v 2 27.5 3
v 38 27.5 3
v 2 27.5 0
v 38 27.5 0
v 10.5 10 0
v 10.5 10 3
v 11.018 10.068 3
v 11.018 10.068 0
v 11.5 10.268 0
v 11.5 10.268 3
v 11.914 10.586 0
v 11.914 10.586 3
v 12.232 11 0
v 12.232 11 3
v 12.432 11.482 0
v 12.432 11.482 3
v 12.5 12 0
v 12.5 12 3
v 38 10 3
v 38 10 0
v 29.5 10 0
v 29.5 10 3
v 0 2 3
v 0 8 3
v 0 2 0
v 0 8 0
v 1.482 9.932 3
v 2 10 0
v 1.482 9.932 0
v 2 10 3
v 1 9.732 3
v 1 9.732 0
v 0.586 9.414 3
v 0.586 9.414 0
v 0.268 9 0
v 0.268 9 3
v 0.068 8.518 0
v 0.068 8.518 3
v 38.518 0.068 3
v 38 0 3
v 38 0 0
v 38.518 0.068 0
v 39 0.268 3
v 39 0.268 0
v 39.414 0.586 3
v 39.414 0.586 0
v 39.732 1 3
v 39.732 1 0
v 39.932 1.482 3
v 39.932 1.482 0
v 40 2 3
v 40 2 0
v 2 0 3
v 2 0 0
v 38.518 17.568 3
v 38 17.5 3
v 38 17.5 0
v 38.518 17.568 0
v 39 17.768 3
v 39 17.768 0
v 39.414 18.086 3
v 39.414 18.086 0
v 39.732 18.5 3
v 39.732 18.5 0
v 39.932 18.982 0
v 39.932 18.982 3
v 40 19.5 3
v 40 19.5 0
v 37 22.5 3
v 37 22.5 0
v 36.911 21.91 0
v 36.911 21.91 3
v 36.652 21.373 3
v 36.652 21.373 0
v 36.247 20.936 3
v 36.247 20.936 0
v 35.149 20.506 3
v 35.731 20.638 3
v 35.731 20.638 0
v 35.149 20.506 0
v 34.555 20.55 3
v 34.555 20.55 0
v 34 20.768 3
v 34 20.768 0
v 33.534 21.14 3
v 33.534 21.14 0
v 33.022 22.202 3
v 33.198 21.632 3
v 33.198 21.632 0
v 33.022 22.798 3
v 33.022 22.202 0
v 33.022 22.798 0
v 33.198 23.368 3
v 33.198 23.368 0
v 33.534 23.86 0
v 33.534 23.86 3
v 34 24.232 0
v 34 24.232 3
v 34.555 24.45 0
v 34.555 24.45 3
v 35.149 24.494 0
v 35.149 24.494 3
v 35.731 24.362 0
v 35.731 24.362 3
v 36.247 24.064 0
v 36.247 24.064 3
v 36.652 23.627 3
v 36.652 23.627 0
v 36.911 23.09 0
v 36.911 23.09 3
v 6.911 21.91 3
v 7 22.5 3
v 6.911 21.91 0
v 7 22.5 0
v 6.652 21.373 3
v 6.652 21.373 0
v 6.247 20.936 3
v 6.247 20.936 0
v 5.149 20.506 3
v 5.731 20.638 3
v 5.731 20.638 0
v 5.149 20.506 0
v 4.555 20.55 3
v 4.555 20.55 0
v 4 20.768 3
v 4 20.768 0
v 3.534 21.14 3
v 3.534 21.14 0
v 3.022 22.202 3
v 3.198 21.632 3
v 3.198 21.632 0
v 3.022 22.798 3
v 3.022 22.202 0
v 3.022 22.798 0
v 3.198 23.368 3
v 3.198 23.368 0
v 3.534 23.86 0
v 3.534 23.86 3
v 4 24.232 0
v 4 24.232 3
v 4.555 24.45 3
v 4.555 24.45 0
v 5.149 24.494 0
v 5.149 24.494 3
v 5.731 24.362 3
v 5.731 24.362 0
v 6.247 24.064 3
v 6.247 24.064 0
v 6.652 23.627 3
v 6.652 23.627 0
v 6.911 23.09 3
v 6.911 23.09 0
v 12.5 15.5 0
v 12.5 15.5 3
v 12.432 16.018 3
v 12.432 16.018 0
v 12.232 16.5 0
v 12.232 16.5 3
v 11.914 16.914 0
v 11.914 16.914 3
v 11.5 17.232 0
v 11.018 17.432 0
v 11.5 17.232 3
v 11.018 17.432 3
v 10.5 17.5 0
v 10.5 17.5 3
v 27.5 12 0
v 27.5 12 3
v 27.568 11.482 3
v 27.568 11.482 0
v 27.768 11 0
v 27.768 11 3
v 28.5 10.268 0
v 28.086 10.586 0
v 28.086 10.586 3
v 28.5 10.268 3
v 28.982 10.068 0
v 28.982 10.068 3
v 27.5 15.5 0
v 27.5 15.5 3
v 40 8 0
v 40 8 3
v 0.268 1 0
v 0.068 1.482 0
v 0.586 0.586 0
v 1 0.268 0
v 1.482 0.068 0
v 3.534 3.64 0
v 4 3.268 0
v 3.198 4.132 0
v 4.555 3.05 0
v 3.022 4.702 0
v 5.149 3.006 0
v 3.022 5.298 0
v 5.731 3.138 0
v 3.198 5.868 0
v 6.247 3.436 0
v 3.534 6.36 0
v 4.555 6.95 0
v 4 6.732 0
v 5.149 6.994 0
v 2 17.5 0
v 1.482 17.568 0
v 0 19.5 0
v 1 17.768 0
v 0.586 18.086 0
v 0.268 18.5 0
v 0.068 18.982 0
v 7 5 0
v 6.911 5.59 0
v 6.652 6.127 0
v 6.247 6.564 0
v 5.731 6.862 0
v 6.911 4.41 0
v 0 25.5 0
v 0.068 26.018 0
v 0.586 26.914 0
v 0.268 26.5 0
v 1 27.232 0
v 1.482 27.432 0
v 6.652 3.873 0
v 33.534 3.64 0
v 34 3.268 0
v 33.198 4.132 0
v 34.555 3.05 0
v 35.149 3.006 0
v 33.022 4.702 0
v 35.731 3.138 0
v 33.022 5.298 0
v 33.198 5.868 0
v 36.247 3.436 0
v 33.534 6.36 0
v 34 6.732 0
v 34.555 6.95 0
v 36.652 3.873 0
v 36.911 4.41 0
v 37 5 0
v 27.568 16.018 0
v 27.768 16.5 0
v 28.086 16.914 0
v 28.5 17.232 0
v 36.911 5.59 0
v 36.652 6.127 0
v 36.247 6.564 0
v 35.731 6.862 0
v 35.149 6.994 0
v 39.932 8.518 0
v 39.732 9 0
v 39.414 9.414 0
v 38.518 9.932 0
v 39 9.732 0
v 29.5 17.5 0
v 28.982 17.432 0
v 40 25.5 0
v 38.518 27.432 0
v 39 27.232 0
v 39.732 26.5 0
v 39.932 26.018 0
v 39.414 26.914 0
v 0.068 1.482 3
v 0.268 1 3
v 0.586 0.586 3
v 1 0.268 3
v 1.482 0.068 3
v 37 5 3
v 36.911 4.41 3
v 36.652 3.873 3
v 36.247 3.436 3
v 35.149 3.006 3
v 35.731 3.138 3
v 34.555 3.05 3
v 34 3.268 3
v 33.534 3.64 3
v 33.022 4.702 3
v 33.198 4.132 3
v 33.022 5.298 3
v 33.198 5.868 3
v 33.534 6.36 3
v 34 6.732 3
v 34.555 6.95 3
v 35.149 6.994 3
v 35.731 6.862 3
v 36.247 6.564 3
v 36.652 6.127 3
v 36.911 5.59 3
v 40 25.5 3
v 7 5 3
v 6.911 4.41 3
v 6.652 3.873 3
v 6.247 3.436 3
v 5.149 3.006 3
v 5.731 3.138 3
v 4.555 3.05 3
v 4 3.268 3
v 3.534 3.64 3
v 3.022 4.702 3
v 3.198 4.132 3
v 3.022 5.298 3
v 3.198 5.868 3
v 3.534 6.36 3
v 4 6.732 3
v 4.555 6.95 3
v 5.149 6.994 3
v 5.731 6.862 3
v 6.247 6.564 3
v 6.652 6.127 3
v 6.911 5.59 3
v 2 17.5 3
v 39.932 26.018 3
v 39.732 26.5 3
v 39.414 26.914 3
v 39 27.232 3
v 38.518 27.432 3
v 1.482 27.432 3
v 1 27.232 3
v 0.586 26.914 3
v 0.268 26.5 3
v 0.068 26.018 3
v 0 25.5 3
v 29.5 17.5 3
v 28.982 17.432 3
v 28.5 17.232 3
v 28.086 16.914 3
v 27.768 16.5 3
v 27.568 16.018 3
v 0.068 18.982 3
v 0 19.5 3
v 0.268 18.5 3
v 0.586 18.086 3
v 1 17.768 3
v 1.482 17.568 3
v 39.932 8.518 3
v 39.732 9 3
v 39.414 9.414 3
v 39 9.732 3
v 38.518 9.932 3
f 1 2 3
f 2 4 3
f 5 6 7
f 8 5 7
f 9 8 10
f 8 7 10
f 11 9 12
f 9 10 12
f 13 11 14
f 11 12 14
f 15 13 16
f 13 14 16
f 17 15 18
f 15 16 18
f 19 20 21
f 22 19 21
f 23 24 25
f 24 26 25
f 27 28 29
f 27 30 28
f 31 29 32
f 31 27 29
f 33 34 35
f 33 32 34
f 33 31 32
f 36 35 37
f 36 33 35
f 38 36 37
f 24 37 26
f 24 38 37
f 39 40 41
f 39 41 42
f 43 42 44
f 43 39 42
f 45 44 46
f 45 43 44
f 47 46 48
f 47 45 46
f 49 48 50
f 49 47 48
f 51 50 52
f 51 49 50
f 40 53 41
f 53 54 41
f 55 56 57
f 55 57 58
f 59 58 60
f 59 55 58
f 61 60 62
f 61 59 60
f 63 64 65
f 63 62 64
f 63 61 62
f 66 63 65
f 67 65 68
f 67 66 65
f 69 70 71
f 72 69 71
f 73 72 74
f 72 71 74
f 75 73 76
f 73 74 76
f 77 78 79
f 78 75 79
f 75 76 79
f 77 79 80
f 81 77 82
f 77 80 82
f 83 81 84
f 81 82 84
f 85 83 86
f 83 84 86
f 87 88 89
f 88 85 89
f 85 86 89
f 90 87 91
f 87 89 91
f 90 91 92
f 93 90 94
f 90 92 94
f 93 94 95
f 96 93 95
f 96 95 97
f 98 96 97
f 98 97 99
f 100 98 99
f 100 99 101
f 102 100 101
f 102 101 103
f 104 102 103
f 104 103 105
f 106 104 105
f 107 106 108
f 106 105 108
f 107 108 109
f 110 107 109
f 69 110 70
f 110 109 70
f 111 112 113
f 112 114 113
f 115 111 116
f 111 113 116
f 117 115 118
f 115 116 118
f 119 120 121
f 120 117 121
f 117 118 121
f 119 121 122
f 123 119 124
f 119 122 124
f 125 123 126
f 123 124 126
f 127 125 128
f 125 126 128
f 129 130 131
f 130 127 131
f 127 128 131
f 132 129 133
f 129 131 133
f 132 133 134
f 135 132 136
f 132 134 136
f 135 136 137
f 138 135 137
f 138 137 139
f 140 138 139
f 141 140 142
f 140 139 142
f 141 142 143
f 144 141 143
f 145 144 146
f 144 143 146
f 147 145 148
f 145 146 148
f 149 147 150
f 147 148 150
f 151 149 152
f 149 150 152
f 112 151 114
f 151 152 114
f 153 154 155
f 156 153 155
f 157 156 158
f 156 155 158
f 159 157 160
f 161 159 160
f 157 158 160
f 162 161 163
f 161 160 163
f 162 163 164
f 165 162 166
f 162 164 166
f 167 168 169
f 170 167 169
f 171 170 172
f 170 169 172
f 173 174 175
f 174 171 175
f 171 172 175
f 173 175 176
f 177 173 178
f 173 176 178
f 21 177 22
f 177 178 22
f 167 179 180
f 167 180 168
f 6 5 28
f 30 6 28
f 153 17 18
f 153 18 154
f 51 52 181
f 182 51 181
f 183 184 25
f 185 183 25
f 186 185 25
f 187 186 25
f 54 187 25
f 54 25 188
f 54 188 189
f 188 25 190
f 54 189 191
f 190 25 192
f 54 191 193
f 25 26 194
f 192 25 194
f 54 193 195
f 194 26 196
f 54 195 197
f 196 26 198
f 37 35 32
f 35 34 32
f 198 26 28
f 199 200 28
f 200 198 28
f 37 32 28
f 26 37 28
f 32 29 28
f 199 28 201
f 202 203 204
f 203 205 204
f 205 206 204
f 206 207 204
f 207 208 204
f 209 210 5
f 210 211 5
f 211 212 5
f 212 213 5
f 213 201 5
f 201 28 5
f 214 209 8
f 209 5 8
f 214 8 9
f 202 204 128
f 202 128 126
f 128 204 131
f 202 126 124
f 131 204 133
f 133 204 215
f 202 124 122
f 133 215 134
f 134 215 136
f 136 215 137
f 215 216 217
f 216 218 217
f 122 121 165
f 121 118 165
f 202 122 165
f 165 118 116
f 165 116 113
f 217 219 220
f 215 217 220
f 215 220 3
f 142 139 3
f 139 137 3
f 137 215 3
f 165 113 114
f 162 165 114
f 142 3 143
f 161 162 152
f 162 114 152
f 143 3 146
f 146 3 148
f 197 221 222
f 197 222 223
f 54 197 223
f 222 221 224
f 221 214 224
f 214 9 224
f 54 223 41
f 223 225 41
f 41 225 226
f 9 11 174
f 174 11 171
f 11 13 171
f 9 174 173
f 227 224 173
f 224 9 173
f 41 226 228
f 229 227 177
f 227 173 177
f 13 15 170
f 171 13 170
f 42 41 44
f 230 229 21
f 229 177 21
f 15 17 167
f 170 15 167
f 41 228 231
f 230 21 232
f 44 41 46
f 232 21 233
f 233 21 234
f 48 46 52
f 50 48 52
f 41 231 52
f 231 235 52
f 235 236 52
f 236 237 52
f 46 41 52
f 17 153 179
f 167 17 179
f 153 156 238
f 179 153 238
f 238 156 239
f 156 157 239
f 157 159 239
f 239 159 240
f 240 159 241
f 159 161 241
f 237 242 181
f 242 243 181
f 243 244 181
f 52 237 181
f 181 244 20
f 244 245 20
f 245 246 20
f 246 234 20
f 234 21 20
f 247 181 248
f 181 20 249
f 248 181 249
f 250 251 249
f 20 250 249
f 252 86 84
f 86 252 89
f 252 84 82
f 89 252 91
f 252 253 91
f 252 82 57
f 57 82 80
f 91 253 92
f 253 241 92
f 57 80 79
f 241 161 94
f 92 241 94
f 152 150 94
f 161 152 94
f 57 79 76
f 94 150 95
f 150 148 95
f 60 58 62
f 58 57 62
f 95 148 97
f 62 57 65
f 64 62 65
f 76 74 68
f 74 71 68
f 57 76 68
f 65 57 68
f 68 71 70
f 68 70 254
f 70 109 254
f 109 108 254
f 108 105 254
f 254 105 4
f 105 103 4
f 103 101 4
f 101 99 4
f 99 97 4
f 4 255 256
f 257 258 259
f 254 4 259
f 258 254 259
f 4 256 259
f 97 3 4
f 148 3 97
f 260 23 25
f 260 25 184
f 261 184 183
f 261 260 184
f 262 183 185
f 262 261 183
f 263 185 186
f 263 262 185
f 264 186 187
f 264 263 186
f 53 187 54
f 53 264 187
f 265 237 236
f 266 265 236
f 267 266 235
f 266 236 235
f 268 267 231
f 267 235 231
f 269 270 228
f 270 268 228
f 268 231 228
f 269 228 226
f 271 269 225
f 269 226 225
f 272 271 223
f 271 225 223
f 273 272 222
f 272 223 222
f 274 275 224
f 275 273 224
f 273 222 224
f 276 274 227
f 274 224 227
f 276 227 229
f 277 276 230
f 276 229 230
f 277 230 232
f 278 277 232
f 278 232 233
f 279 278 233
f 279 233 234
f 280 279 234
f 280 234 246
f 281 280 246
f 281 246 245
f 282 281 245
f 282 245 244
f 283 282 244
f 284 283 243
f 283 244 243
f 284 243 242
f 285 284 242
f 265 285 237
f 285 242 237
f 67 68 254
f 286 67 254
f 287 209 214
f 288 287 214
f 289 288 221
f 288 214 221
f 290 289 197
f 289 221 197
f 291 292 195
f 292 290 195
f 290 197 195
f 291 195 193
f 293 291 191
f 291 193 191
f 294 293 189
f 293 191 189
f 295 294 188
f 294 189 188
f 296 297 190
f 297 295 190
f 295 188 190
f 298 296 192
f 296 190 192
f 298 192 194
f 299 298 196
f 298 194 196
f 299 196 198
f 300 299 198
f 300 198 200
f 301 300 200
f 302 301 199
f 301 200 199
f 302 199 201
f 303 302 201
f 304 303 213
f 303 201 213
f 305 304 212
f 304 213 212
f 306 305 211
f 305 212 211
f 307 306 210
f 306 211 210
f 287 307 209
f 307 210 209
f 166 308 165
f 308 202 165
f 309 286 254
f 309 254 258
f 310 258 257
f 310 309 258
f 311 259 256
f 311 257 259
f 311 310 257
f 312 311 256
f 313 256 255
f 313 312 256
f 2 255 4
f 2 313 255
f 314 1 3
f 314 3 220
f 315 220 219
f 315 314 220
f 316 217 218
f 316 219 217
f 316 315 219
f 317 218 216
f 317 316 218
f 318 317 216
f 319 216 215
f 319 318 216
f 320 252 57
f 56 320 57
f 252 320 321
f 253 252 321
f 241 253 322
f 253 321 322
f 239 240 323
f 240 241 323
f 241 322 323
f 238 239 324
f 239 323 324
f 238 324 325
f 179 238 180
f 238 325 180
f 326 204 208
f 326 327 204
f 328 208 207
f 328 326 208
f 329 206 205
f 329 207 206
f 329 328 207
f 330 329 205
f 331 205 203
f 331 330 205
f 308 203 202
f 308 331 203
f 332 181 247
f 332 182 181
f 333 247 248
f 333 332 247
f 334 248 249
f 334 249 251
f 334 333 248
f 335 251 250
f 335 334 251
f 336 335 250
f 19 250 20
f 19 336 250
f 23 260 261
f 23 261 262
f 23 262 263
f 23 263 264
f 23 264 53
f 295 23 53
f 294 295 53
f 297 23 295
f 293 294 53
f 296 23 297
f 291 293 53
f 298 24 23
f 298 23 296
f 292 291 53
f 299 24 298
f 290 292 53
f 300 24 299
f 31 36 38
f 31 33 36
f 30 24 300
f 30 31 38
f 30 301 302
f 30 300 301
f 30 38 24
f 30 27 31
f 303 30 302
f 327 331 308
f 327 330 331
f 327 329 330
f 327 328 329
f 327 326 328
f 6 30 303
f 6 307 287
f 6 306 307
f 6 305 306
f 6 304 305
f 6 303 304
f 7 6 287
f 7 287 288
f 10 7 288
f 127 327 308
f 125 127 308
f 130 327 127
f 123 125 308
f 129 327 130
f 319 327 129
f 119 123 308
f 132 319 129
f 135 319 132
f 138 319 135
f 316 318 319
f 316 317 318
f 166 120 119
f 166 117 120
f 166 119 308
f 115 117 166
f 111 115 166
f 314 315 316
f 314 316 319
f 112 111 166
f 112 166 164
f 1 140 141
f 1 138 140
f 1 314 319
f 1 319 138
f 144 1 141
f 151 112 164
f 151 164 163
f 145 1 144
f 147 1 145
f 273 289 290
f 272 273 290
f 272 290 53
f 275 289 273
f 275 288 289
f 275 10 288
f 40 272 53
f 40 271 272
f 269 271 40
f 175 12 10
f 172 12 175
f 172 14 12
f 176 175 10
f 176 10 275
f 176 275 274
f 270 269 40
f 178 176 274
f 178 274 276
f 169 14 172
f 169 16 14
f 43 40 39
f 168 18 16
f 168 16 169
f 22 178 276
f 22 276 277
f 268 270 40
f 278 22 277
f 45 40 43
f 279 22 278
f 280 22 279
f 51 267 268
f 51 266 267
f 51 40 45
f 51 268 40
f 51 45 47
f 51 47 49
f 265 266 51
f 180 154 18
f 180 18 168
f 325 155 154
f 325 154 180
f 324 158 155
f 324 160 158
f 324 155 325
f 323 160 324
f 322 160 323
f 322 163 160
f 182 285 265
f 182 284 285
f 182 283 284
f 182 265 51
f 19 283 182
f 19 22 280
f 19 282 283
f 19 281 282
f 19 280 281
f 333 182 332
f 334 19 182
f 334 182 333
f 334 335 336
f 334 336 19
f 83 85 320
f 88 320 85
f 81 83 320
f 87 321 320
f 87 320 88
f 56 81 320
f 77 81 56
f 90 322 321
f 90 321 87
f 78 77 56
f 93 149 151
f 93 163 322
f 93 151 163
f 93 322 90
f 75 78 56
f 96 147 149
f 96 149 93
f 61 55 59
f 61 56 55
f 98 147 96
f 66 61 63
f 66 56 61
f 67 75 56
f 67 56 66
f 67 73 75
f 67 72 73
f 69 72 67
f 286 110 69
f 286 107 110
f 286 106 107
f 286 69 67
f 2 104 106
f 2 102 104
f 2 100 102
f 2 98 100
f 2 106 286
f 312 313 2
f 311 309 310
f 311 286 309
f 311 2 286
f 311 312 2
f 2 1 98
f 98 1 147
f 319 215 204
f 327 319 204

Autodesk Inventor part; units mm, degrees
ref_plane "YZ Plane" through (0, 0, 0) normal (1, 0, 0) x (0, 1, 0)
ref_plane "XZ Plane" through (0, 0, 0) normal (0, 1, 0) x (-1, 0, 0)
ref_plane "XY Plane" through (0, 0, 0) normal (0, 0, 1) x (1, 0, 0)
sketch "スケッチ1" plane through (0, 0, 0) normal (0, 0, 1) x (1, 0, 0)
  line L0 (0, 0) -> (40, 0)
  line L1 (40, 0) -> (40, 10)
  line L2 (40, 10) -> (0, 10)
  line L3 (0, 10) -> (0, 0)
  line L4 (12.5, 17.5) -> (27.5, 17.5)
  line L5 (27.5, 17.5) -> (27.5, 10)
  line L6 (27.5, 10) -> (12.5, 10)
  line L7 (12.5, 10) -> (12.5, 17.5)
  line L8 (0, 17.5) -> (40, 17.5)
  line L9 (40, 17.5) -> (40, 27.5)
  line L10 (40, 27.5) -> (0, 27.5)
  line L11 (0, 27.5) -> (0, 17.5)
  circle A0 centre (5, 5) radius 2
  circle A1 centre (35, 5) radius 2
  circle A2 centre (5, 22.5) radius 2
  circle A3 centre (35, 22.5) radius 2
  point P0 (40, 22.5)
  point P1 (0, 5)
  point P2 (40, 5)
  point P3 (20, 17.5)
  point P4 (12.5, 20)
  point P5 (27.5, 20)
  dimension "d0" = 40
  dimension "d1" = 10
  dimension "d2" = 7.5
  dimension "d3" = 15
  dimension "d4" = 12.5
  dimension "d5" = 40
  dimension "d6" = 10
  dimension "d8" = 12.5
  dimension "d9" = 4
  dimension "d10" = 4
  dimension "d11" = 4
  dimension "d12" = 4
  dimension "d16" = 5
  dimension "d17" = 5
  dimension "d25" = 7.5
extrude "押し出し1" add sketch "スケッチ1" along normal blind 3
fillet "フィレット1" radius 2 12 edges at (40, 27.5, 1.5) (40, 17.5, 1.5) (0, 27.5, 1.5) (0, 17.5, 1.5) (12.5, 17.5, 1.5) (27.5, 17.5, 1.5) (27.5, 10, 1.5) (40, 10, 1.5) (40, 0, 1.5) (12.5, 10, 1.5) (0, 10, 1.5) (0, 0, 1.5)
equation "\"d8\" = d4"
properties part number "mountT"
